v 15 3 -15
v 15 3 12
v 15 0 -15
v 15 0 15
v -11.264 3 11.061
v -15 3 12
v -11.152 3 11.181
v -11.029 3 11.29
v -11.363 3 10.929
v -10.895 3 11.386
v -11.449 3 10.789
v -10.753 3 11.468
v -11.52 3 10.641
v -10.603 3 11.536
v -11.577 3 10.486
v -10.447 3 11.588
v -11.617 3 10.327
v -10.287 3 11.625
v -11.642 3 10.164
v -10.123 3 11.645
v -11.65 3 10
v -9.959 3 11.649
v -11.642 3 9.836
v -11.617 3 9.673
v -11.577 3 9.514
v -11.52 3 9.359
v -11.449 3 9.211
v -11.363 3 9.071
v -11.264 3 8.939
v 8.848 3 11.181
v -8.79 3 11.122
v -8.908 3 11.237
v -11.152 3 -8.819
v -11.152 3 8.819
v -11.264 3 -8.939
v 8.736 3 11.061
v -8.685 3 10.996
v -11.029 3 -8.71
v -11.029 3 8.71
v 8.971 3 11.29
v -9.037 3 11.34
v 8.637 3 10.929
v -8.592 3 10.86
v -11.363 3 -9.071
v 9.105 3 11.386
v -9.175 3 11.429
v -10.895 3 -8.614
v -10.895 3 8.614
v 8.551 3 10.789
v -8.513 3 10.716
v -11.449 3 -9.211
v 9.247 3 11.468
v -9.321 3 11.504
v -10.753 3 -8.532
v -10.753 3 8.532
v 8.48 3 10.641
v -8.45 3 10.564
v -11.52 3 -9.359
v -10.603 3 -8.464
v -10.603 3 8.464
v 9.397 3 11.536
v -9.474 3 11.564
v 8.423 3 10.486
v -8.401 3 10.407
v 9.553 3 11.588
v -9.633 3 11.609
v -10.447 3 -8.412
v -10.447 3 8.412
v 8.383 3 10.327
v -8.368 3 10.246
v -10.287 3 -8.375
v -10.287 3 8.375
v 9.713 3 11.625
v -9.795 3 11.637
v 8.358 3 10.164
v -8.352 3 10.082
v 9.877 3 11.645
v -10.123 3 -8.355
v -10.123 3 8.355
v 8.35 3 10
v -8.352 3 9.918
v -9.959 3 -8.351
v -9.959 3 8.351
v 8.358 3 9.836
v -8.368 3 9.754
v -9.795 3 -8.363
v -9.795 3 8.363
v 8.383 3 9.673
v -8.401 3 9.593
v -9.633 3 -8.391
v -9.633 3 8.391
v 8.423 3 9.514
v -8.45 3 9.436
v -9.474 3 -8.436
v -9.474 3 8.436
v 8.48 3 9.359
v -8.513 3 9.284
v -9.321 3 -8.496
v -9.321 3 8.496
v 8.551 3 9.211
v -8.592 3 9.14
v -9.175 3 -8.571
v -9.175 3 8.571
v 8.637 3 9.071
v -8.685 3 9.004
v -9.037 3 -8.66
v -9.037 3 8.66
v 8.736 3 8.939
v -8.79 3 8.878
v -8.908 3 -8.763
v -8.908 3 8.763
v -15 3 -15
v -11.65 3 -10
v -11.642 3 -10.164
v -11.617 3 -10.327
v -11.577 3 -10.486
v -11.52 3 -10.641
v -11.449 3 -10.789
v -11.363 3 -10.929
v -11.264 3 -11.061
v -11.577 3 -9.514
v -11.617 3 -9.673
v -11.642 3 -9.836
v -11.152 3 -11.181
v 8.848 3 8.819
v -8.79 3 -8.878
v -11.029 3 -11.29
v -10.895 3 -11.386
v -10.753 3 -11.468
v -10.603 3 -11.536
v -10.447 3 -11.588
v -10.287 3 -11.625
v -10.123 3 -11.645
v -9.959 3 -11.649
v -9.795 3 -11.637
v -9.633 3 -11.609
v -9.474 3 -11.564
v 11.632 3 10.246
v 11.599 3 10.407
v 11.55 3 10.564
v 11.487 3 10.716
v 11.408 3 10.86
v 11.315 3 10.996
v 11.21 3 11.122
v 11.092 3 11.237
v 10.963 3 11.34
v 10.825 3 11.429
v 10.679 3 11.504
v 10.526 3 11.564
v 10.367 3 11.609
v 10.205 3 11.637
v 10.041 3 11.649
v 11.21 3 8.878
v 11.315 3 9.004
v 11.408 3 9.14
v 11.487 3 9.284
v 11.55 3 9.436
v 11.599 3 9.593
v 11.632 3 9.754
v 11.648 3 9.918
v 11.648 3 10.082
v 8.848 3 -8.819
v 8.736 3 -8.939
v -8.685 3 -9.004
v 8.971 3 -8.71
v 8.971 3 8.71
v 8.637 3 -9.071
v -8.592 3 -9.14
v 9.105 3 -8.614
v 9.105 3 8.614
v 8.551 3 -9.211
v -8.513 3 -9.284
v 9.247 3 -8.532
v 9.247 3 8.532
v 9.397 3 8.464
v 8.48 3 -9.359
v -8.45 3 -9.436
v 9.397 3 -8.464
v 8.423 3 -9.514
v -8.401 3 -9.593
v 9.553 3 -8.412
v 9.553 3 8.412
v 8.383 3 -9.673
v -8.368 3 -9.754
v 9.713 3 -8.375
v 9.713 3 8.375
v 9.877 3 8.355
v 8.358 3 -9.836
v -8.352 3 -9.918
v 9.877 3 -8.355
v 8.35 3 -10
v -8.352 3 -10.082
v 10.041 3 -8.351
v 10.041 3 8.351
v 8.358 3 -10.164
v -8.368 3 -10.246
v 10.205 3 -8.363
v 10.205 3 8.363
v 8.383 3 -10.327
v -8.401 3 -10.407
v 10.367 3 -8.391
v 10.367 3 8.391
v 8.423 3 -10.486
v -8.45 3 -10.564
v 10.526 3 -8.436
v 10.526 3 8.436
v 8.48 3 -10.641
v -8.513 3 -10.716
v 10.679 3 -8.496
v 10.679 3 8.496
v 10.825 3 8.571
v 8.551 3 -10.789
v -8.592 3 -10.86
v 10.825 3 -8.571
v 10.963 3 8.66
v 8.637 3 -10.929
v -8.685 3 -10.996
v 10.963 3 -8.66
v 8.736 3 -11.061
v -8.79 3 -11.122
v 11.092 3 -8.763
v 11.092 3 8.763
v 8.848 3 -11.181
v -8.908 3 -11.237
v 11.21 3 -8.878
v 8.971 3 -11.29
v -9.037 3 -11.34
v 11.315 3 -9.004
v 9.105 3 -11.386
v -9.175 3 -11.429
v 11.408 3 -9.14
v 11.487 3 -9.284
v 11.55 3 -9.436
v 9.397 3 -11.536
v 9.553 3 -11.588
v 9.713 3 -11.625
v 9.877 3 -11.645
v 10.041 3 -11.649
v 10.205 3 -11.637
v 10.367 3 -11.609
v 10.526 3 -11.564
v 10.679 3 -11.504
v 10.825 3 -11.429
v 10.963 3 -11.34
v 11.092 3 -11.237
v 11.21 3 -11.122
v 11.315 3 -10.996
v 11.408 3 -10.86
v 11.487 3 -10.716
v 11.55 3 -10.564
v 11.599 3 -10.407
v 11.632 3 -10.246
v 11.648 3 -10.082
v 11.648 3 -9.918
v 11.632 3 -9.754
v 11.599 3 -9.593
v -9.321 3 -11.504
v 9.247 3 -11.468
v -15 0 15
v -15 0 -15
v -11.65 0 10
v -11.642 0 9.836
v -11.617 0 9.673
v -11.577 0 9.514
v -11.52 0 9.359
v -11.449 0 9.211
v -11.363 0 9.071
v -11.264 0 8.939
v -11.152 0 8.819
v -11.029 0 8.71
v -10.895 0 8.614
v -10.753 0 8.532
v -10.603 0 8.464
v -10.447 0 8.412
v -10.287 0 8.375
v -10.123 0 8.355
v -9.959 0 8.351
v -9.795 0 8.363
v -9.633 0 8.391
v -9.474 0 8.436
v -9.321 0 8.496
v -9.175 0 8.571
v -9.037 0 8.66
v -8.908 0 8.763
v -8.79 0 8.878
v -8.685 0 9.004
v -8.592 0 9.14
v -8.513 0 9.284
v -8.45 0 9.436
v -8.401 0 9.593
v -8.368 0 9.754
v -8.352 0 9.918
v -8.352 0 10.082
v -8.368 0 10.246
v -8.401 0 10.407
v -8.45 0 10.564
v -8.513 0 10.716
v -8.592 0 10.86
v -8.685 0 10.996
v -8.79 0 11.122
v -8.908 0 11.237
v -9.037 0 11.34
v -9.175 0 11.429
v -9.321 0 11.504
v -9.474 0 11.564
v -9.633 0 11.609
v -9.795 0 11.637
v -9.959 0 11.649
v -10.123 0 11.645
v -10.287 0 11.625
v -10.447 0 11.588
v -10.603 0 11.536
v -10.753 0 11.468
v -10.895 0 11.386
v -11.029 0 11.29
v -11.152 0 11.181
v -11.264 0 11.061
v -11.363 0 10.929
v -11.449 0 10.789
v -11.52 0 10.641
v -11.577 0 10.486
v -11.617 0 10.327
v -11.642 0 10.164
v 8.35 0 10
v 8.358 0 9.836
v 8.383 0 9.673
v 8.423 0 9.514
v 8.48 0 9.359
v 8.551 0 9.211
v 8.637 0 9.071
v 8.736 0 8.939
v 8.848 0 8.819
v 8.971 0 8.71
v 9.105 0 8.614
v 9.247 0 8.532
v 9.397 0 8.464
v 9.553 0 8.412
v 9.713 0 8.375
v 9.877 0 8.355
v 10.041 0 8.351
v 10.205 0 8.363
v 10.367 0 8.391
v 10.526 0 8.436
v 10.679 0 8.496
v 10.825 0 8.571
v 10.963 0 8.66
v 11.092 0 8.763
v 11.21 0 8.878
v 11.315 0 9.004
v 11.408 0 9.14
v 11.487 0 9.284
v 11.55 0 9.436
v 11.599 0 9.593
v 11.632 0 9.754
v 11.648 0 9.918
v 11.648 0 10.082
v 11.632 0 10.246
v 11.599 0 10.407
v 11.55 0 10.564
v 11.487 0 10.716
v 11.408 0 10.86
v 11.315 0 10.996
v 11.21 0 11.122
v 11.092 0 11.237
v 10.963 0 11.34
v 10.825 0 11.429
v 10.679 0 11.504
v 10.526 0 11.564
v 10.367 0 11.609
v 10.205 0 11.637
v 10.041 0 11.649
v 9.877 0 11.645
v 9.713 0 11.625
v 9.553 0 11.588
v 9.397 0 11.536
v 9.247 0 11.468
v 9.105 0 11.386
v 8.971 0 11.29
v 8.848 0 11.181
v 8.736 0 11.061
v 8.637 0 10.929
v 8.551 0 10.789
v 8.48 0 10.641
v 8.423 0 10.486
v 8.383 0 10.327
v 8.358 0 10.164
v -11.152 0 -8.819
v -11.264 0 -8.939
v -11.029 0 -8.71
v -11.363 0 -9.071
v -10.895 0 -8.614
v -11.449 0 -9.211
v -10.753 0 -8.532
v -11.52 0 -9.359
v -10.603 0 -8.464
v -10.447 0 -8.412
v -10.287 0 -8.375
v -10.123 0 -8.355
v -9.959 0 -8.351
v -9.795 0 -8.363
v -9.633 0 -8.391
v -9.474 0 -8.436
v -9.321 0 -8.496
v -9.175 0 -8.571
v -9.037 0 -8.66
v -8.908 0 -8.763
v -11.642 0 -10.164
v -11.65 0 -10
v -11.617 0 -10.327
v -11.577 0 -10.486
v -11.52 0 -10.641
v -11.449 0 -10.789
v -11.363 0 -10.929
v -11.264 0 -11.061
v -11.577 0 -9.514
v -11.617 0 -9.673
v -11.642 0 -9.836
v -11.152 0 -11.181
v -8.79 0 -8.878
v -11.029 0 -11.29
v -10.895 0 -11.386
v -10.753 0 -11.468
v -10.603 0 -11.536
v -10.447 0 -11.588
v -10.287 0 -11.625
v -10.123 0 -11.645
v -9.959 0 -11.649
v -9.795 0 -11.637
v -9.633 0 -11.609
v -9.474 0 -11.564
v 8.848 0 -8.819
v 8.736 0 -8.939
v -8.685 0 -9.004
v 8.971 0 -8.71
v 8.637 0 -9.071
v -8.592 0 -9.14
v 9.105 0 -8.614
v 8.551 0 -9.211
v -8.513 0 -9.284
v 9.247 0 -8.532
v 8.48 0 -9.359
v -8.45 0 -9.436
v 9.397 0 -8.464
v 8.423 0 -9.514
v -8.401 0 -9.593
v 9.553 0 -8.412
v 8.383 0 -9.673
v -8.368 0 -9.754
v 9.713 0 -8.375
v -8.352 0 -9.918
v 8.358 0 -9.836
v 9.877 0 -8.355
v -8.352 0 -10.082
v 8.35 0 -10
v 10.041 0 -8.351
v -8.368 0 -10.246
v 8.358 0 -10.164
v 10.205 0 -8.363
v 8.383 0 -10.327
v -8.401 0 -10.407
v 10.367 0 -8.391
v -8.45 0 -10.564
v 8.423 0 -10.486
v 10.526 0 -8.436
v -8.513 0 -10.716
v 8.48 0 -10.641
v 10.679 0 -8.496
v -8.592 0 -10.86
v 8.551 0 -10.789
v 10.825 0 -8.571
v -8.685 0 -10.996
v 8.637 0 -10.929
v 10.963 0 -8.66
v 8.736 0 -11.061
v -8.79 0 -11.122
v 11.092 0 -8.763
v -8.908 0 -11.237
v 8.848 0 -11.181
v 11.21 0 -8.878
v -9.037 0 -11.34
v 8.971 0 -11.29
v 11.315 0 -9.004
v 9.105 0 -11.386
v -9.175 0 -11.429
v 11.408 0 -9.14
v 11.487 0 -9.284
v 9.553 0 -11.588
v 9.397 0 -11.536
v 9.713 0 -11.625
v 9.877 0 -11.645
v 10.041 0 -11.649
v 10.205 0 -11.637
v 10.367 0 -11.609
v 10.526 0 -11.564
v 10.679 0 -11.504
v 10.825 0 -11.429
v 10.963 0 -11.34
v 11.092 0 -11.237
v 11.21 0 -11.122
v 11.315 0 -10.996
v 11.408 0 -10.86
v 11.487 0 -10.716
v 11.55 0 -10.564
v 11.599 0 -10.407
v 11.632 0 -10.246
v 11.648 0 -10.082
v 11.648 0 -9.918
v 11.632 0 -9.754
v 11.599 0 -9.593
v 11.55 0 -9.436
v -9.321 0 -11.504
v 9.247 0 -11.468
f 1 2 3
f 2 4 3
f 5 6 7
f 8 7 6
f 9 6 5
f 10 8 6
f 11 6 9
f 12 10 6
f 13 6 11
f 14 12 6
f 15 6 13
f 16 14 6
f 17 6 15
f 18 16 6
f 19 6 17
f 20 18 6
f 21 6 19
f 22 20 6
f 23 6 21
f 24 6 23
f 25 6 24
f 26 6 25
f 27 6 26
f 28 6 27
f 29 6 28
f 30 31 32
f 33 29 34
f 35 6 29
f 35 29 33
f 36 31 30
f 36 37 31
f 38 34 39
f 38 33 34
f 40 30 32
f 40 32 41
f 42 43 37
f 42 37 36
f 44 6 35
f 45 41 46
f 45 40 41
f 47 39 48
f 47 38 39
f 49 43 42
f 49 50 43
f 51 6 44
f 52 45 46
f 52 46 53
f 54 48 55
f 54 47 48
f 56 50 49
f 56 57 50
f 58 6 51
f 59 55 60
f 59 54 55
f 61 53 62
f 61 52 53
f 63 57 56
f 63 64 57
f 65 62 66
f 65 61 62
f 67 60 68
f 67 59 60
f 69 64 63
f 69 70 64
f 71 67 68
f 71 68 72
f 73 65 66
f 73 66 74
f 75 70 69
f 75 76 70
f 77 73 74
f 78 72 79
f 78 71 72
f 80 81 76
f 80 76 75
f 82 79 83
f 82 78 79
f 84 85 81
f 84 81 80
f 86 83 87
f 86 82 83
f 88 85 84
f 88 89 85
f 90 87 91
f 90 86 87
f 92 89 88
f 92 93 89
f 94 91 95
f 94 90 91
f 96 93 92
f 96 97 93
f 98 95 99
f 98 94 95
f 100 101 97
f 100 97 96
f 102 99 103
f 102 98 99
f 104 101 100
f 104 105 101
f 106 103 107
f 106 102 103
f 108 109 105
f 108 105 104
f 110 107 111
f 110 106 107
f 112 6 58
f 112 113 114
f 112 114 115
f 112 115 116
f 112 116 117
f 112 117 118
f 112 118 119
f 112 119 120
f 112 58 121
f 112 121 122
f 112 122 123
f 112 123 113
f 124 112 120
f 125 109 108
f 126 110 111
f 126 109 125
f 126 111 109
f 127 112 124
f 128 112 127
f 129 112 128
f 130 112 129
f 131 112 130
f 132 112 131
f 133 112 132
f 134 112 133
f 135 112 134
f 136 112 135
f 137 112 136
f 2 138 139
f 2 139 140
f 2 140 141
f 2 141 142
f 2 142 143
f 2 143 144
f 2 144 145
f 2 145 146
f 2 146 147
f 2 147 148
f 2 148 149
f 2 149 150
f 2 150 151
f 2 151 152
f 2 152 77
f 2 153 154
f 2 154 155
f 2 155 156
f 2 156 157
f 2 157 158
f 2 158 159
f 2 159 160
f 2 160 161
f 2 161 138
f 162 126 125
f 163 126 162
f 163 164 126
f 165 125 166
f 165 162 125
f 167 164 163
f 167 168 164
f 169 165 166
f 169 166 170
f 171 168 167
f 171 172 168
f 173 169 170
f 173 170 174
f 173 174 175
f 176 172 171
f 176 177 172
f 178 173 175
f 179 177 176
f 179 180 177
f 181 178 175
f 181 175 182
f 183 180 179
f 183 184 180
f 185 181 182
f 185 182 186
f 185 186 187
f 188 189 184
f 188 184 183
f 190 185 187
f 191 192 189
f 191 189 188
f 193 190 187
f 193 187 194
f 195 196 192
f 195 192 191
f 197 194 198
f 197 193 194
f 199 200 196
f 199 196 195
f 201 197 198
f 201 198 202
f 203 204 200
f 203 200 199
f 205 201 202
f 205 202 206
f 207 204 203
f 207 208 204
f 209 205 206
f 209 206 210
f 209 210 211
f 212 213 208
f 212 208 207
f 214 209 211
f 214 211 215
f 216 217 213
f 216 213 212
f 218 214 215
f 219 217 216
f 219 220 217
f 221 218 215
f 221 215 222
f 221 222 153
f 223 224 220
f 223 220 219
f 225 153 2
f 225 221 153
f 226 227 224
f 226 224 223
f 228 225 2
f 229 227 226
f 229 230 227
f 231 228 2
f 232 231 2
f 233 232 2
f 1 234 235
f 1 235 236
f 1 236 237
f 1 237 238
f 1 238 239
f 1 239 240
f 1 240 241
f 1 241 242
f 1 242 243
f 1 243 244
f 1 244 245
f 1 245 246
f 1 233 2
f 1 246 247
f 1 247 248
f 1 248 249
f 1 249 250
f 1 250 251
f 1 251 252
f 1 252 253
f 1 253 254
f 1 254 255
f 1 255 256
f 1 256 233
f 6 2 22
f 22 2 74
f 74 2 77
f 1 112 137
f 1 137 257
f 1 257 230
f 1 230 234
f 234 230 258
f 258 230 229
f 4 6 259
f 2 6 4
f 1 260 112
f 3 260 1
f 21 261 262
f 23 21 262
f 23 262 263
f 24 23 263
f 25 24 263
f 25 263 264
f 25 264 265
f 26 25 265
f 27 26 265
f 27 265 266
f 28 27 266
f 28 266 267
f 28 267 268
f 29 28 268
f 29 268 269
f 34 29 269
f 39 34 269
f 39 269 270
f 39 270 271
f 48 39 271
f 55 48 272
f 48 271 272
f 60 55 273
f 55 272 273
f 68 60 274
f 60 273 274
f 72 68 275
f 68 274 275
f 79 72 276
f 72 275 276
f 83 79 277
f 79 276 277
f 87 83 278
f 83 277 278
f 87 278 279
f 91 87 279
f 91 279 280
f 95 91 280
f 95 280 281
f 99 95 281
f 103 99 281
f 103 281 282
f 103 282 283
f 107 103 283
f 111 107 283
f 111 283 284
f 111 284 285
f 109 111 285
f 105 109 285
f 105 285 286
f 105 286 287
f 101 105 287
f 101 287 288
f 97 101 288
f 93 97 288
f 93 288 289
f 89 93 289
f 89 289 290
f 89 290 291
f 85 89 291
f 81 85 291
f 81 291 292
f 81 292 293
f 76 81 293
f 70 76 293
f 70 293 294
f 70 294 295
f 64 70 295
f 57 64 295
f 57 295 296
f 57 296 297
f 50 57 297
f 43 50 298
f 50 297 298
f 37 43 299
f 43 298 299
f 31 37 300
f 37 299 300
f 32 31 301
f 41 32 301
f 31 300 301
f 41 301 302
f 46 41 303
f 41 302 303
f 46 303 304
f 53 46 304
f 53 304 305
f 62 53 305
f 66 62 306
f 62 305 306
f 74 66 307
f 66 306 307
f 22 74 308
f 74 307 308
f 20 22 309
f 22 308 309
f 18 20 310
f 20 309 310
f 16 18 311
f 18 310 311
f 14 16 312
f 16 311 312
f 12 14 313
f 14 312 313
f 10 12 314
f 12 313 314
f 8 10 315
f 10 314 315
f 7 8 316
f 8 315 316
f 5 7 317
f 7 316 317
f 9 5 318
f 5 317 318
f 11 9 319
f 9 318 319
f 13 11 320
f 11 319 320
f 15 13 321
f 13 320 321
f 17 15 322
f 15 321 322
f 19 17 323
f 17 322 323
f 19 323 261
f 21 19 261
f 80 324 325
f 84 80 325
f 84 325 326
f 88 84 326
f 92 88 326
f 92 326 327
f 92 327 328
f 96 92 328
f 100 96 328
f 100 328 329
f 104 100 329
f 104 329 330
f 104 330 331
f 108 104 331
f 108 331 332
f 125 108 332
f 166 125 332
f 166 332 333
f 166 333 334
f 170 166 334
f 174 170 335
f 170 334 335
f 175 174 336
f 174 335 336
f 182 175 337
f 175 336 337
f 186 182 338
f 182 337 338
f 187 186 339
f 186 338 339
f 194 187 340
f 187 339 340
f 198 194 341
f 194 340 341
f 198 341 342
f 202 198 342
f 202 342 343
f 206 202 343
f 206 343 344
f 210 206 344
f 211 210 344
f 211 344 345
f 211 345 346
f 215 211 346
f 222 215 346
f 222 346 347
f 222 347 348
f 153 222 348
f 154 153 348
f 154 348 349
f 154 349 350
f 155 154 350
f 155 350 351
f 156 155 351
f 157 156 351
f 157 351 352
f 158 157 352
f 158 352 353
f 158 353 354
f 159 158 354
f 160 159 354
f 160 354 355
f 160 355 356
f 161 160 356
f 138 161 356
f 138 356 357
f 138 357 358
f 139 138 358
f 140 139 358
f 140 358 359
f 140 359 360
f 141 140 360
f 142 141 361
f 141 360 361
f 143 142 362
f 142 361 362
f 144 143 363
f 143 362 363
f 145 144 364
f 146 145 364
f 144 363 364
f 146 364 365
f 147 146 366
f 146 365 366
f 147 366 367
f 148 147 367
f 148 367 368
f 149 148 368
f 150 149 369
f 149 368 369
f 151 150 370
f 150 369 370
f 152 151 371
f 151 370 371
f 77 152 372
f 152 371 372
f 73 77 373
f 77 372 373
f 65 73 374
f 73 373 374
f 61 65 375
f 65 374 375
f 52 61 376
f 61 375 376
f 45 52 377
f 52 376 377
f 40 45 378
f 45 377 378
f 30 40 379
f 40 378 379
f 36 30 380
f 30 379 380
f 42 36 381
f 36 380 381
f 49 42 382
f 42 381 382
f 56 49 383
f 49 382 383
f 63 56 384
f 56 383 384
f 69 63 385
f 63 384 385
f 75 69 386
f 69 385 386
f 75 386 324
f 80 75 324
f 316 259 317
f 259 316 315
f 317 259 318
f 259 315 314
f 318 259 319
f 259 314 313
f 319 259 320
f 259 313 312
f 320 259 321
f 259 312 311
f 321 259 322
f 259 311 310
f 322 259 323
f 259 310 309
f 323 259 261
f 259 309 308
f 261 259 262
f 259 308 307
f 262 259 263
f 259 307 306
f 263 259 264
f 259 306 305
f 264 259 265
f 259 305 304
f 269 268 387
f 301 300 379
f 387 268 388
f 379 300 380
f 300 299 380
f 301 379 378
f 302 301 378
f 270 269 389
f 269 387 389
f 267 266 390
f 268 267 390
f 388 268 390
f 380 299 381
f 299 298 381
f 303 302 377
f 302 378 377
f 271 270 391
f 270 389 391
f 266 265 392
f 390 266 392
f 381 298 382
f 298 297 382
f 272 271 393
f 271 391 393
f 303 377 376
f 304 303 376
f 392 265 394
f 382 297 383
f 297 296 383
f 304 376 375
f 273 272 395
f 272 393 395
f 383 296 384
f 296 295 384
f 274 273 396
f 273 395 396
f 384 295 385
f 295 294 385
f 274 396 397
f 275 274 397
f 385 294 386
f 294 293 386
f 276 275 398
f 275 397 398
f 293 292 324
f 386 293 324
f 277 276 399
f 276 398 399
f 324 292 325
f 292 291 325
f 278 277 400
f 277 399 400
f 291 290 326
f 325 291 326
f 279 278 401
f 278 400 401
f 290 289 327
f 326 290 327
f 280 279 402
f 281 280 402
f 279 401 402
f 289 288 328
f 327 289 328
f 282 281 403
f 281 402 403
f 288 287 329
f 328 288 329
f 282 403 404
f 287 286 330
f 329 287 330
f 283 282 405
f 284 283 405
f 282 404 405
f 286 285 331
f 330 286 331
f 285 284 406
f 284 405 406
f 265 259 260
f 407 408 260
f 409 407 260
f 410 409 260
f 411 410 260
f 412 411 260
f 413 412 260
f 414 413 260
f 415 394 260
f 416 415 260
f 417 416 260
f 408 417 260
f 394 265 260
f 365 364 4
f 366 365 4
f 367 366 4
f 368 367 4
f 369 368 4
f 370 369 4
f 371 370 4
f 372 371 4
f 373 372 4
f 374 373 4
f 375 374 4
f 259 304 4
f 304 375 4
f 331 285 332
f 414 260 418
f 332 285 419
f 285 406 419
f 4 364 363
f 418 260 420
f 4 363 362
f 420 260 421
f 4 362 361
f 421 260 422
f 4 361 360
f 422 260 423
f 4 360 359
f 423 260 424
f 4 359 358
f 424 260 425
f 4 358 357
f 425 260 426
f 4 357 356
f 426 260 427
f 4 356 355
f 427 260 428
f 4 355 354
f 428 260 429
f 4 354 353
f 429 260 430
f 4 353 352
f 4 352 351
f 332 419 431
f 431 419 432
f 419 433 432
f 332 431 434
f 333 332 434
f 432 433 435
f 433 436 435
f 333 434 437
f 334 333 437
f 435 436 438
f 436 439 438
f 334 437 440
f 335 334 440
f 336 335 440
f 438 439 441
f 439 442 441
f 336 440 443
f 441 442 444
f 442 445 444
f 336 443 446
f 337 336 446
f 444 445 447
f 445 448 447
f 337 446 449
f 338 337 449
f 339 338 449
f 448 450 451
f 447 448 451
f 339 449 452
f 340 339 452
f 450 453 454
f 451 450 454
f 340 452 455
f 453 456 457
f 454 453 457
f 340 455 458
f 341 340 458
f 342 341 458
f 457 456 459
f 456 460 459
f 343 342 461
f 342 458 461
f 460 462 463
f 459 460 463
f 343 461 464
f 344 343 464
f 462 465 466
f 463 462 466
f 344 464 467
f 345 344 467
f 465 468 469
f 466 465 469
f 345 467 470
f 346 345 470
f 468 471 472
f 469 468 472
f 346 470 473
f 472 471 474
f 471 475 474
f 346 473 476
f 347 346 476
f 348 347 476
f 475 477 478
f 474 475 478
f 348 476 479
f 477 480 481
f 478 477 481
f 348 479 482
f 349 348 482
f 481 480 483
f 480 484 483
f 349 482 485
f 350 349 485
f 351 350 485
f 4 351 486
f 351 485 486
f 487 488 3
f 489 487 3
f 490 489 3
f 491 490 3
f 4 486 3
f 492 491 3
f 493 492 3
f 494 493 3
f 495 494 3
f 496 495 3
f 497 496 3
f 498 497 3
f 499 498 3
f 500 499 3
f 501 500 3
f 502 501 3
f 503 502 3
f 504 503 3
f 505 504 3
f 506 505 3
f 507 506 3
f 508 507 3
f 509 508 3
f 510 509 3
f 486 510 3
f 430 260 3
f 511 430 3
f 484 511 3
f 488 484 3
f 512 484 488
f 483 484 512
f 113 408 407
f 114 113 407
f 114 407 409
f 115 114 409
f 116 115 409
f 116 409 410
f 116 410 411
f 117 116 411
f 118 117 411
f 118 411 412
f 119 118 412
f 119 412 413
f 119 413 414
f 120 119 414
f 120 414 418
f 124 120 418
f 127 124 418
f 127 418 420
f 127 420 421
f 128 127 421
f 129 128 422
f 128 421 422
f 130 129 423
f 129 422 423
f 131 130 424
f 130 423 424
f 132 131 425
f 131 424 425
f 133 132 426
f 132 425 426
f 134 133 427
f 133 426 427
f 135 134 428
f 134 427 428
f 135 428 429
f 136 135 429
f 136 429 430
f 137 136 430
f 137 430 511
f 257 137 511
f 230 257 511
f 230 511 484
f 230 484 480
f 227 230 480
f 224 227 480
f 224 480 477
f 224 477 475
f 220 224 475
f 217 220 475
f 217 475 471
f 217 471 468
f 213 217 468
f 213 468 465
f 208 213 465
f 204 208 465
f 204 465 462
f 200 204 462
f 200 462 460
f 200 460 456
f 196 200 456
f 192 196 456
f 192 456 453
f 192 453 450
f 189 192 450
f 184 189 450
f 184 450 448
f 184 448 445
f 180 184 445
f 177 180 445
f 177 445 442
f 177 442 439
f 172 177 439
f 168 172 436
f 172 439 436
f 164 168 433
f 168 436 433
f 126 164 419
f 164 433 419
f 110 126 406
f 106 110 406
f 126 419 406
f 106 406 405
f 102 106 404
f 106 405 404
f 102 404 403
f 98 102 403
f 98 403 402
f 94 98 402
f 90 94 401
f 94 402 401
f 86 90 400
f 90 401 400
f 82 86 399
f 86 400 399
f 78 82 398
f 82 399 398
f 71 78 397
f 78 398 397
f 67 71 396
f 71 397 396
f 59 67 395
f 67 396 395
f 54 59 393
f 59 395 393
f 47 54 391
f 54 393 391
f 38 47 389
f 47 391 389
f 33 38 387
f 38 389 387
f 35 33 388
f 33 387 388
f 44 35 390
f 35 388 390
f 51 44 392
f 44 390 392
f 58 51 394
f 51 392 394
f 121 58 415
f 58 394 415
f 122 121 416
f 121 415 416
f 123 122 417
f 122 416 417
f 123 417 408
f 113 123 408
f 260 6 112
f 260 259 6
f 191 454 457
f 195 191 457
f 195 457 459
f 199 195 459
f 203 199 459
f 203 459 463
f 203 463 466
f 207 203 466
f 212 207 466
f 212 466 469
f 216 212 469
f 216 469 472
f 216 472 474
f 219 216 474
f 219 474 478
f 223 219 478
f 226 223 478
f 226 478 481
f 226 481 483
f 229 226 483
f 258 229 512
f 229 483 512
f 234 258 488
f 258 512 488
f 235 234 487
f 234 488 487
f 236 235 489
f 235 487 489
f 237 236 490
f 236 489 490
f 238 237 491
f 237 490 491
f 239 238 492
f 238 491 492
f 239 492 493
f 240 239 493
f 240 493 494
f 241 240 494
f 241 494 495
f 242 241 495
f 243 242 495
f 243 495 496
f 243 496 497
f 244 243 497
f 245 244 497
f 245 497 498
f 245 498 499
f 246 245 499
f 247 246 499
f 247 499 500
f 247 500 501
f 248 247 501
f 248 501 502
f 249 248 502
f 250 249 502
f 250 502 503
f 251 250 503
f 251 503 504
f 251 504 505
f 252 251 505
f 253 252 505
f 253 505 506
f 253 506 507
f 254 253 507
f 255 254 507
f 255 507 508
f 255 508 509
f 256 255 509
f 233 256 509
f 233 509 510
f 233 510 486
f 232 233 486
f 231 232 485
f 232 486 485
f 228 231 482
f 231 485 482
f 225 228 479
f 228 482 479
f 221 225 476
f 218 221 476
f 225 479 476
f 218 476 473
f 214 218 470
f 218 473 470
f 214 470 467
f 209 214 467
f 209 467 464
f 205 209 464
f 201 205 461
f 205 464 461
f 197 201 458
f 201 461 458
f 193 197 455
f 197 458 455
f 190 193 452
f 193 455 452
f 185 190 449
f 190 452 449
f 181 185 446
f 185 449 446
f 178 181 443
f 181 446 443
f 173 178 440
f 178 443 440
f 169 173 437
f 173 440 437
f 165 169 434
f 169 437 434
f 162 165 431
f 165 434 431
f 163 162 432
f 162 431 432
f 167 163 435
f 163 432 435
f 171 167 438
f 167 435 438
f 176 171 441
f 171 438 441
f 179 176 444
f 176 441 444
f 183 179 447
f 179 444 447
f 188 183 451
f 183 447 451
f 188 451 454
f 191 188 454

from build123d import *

# Parameters (mm, degrees)
SKETCH1_W             = 30
SKETCH1_H             = 30
BOSS_EXTRUDE1_DEPTH   = 3
M4X0_7_TAPPED_HOLE1_D = 3.3
CHAMFER2_SIZE         = 3


with BuildPart() as part:
    # Sketch1 → Boss-Extrude1 (new body)
    with BuildSketch(Plane(origin=(0, 0, 0), x_dir=(1, 0, 0), z_dir=(0, 1, 0))):
        Rectangle(SKETCH1_W, SKETCH1_H)
    extrude(amount=BOSS_EXTRUDE1_DEPTH)

    # M4x0.7 Tapped Hole1 (through all)
    with Locations(Plane(origin=(0, 3, 0), x_dir=(1, 0, 0), z_dir=(0, 1, 0))):
        with Locations((-10, -10), (-10, 10), (10, 10), (10, -10)):
            Hole(M4X0_7_TAPPED_HOLE1_D / 2)

    # Chamfer2
    chamfer2_edges = [part.edges().sort_by_distance(p)[0] for p in [
        (0, 3, 15),
    ]]
    chamfer(chamfer2_edges, length=CHAMFER2_SIZE - 0.0001)  # a hair under: the kernel refuses the full size


solid = part.part
